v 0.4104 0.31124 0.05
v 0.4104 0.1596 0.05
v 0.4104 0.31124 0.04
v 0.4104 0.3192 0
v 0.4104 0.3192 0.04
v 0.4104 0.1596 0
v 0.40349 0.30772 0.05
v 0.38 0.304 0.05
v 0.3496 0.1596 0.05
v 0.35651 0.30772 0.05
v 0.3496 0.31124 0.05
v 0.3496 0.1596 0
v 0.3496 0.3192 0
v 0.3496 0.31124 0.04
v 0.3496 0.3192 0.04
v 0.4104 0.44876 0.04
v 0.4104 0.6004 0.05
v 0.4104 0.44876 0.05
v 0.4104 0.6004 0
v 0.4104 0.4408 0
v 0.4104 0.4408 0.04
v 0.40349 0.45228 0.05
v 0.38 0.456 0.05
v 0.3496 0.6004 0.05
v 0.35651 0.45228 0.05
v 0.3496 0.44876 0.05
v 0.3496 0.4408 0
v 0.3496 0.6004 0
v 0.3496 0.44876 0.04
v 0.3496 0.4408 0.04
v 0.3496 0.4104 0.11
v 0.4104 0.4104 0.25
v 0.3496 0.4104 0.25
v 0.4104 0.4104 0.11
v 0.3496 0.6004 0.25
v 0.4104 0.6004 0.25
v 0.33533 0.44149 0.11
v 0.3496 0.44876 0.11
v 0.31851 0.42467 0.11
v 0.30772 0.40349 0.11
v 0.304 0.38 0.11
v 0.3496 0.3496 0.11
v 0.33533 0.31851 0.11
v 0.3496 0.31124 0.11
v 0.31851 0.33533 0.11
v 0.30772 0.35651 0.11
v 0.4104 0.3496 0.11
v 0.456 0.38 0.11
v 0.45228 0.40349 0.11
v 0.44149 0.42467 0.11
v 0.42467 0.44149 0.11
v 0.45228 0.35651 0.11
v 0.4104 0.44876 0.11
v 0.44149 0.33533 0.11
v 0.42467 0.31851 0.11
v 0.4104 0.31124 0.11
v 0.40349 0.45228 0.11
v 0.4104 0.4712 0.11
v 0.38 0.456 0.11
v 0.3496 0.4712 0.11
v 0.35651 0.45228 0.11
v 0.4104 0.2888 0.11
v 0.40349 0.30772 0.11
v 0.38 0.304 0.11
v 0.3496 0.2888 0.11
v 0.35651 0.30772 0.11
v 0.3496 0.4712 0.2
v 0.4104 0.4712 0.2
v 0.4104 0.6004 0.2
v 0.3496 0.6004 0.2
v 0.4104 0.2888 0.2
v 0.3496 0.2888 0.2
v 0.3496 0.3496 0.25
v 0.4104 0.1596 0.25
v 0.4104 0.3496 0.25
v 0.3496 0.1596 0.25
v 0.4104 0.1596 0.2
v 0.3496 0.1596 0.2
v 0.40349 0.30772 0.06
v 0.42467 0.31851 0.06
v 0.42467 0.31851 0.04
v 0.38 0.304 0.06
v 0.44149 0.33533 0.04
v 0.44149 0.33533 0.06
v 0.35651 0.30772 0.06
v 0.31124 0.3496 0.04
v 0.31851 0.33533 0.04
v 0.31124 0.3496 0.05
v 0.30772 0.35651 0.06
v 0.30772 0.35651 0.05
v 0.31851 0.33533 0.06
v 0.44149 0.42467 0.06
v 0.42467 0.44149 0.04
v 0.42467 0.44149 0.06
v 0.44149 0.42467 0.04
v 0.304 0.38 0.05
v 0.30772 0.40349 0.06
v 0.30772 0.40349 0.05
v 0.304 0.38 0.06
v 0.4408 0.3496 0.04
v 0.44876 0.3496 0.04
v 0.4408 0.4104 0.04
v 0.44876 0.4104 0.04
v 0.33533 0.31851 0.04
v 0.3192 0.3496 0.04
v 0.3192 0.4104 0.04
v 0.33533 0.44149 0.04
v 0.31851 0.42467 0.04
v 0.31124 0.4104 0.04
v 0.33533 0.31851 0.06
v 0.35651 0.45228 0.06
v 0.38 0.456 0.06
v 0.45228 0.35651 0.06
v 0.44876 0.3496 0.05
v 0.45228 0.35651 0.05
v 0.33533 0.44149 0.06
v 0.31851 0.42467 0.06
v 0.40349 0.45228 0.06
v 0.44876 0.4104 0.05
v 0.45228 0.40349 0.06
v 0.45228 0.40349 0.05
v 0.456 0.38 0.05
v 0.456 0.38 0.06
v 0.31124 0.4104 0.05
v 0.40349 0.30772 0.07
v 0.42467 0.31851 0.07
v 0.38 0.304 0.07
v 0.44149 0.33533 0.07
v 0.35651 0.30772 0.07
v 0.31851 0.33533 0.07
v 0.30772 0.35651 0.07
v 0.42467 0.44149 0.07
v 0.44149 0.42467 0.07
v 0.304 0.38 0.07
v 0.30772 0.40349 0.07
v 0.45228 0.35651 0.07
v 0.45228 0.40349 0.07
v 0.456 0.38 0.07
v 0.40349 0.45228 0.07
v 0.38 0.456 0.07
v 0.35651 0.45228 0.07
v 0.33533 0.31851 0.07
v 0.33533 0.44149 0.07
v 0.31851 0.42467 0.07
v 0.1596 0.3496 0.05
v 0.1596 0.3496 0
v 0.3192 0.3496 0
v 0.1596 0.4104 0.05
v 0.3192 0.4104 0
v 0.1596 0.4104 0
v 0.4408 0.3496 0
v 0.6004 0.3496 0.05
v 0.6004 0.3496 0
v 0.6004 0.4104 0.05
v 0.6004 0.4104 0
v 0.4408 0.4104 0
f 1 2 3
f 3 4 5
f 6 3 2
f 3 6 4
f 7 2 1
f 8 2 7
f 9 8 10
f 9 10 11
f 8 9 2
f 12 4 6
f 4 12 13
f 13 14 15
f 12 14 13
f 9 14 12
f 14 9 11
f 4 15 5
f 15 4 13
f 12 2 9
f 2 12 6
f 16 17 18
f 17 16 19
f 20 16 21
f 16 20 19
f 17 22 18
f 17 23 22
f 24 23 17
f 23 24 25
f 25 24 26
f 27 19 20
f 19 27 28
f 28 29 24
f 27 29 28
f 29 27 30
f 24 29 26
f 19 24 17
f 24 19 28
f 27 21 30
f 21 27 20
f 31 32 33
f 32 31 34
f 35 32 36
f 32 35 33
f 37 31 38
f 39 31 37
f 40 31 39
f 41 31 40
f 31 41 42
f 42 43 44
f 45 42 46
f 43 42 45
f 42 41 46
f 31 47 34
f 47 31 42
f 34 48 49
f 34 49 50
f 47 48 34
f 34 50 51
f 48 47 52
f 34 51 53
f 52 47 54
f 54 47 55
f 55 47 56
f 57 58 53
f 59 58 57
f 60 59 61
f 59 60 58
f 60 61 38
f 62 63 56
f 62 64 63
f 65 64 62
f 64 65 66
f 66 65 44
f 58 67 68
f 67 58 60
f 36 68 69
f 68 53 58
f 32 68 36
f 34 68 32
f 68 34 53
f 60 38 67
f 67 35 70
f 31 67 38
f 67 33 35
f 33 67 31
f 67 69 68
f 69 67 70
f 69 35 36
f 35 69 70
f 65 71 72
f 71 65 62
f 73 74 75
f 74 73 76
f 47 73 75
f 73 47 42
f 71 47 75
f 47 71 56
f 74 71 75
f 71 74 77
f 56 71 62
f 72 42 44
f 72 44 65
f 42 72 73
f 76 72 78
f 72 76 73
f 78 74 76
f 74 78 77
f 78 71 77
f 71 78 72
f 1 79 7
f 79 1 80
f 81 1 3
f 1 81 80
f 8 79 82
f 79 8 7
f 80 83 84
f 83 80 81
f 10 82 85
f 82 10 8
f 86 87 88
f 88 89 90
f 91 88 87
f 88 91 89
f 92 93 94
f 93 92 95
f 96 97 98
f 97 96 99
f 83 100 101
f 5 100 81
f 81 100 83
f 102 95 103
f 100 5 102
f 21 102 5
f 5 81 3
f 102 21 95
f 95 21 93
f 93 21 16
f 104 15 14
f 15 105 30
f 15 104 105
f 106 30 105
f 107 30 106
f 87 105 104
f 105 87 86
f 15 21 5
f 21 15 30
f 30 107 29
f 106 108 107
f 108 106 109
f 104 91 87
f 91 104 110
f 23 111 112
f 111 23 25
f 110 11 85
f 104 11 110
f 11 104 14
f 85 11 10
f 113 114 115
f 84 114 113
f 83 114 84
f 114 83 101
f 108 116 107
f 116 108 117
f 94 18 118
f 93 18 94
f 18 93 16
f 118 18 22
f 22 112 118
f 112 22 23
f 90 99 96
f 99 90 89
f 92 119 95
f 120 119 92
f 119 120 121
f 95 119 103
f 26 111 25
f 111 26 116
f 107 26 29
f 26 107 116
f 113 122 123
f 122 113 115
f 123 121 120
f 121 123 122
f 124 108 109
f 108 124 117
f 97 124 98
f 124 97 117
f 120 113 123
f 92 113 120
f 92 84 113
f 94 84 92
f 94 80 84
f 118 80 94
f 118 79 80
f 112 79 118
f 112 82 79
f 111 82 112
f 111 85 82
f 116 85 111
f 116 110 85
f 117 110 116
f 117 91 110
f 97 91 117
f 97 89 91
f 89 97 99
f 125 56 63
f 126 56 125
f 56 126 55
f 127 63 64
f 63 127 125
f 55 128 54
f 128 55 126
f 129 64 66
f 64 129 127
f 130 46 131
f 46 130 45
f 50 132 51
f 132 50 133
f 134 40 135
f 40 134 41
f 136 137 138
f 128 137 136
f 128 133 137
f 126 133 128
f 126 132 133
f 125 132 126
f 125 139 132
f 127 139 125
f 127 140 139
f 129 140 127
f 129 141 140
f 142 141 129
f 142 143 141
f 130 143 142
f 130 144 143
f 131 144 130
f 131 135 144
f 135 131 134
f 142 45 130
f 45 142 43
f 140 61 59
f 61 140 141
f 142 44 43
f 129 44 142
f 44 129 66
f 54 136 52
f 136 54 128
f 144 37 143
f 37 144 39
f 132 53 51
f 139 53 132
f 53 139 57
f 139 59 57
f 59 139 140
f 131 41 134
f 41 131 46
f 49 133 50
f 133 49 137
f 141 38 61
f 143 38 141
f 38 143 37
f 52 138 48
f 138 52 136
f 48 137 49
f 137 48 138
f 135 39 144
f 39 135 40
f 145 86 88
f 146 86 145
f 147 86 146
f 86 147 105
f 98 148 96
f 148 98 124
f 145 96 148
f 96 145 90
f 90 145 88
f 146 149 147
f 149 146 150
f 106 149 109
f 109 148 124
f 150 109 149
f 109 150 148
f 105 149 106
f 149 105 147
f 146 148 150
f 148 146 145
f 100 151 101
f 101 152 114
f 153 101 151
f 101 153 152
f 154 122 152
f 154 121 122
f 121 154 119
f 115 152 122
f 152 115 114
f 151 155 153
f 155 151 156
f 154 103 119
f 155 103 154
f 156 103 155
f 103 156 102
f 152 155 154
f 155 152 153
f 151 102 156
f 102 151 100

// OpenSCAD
use <../../../scad_include/routing.scad>

px    = 7.6*10^-3;
layer = 10*10^-3;

$fn = 20;

module valve_20px4way_0(xpos, ypos, zpos, orientation){
    
    // Parameteres
    h_fluid = 2*layer;
    t_memb = layer;
    h_air = 4*layer;
    h_total = h_fluid + t_memb + h_air; // 7*layer
    d_valve = 20*px;

    // Valve connection channels
    xychan0 = 6*px;
    xychan = 8*px;
    hchan = 5*layer;
    hchan_px = 8*px;
    wchan = 8*px;

    dimm        =   [
                        [[0, 0], [-wchan/2, wchan/2], [0, hchan]], // 0
                        [[-wchan/2, wchan/2], [0, 0], [0, hchan]], // 1
                        [[-xychan/2, xychan/2], [-xychan/2, xychan/2], [0, 0]], // 2
                        [[-xychan0/2, xychan0/2], [-xychan0/2, xychan0/2], [0, 0]], // 3
                        [[-xychan/2, xychan/2], [0, hchan_px], [0, 0]], // 4
                    ];

    overlap_v_xy  = 2*px;

    module obj(){
        // Fluid compartment
        color("CadetBlue")
        cylinder(d = d_valve, h = h_fluid);

        // Air compartment
        color("SteelBlue")
        translate([0,0,h_fluid + t_memb])
        cylinder(d = d_valve, h = h_air);

        // Fluid in channel connection
        pt_fluid_in         = [0, -d_valve/2 + overlap_v_xy, 1*layer - hchan];
        pt_fluid_in_next    = [
                                ["+y", -21*px, 1],
                              ];
        color("Blue")
        routing(pt_fluid_in,pt_fluid_in_next, dimm);

        // Fluid out channel connection
        pt_fluid_out        = [0, d_valve/2 - overlap_v_xy, 1*layer - hchan];
        pt_fluid_out_next   = [
                                ["+y", 21*px, 1],
                              ];
        color("Red")
        routing(pt_fluid_out,pt_fluid_out_next, dimm);

        rotate(90){
            // Fluid in channel connection
            pt_fluid_in         =   [0, -d_valve/2 + overlap_v_xy, 1*layer - hchan];
            pt_fluid_in_next    =   [
                                        ["+y", -21*px, 1],
                                    ];

            routing(pt_fluid_in,pt_fluid_in_next, dimm);

            // Fluid out channel connection
            pt_fluid_out        =   [0, d_valve/2 - overlap_v_xy, 1*layer - hchan];
            pt_fluid_out_next   =   [
                                        ["+y", 21*px, 1],
                                    ];

            routing(pt_fluid_out,pt_fluid_out_next, dimm);
        }

        // Air control channel connection
        pt_air_control      = [-d_valve/2 - xychan/2 + 6*px, 0, h_total];
        pt_air_control_next = [
                                ["+zx", [9*layer, -21*px]],
                              ];

        color("Red")
        routing(pt_air_control,pt_air_control_next, dimm);

        // Air flushing channel connection
        pt_air_flush        = [d_valve/2 + xychan/2 - 6*px, 0, h_total];
        pt_air_flush_next   = [
                                ["+zx", [9*layer, 21*px]],
                              ];
        color("Blue")
        routing(pt_air_flush,pt_air_flush_next, dimm);
    }
    
    if (orientation == "N"){
        rotate(270)
        translate([-25*px*2 - ypos*px, 25*px*2 + xpos*px, 4*layer + zpos*layer])
        obj();
    }
    if (orientation == "FN"){
        mirror([1, 0 , 0])
        rotate(270)
        translate([-25*px*2 - ypos*px, -25*px*2 - xpos*px, 4*layer + zpos*layer])
        obj();
    }
    if (orientation == "FS"){
        mirror([0, 1, 0])
        rotate(270)
        translate([25*px*2 + ypos*px, 25*px*2 + xpos*px, 4*layer + zpos*layer])
        obj();
    }
    if (orientation == "S"){
        mirror([0, 1, 0])
        mirror([1, 0 , 0])
        rotate(270)
        translate([25*px*2 + ypos*px, -25*px*2 - xpos*px, 4*layer + zpos*layer])
        obj();
    }
    
}

 valve_20px4way_0(0,0,0,"N");
